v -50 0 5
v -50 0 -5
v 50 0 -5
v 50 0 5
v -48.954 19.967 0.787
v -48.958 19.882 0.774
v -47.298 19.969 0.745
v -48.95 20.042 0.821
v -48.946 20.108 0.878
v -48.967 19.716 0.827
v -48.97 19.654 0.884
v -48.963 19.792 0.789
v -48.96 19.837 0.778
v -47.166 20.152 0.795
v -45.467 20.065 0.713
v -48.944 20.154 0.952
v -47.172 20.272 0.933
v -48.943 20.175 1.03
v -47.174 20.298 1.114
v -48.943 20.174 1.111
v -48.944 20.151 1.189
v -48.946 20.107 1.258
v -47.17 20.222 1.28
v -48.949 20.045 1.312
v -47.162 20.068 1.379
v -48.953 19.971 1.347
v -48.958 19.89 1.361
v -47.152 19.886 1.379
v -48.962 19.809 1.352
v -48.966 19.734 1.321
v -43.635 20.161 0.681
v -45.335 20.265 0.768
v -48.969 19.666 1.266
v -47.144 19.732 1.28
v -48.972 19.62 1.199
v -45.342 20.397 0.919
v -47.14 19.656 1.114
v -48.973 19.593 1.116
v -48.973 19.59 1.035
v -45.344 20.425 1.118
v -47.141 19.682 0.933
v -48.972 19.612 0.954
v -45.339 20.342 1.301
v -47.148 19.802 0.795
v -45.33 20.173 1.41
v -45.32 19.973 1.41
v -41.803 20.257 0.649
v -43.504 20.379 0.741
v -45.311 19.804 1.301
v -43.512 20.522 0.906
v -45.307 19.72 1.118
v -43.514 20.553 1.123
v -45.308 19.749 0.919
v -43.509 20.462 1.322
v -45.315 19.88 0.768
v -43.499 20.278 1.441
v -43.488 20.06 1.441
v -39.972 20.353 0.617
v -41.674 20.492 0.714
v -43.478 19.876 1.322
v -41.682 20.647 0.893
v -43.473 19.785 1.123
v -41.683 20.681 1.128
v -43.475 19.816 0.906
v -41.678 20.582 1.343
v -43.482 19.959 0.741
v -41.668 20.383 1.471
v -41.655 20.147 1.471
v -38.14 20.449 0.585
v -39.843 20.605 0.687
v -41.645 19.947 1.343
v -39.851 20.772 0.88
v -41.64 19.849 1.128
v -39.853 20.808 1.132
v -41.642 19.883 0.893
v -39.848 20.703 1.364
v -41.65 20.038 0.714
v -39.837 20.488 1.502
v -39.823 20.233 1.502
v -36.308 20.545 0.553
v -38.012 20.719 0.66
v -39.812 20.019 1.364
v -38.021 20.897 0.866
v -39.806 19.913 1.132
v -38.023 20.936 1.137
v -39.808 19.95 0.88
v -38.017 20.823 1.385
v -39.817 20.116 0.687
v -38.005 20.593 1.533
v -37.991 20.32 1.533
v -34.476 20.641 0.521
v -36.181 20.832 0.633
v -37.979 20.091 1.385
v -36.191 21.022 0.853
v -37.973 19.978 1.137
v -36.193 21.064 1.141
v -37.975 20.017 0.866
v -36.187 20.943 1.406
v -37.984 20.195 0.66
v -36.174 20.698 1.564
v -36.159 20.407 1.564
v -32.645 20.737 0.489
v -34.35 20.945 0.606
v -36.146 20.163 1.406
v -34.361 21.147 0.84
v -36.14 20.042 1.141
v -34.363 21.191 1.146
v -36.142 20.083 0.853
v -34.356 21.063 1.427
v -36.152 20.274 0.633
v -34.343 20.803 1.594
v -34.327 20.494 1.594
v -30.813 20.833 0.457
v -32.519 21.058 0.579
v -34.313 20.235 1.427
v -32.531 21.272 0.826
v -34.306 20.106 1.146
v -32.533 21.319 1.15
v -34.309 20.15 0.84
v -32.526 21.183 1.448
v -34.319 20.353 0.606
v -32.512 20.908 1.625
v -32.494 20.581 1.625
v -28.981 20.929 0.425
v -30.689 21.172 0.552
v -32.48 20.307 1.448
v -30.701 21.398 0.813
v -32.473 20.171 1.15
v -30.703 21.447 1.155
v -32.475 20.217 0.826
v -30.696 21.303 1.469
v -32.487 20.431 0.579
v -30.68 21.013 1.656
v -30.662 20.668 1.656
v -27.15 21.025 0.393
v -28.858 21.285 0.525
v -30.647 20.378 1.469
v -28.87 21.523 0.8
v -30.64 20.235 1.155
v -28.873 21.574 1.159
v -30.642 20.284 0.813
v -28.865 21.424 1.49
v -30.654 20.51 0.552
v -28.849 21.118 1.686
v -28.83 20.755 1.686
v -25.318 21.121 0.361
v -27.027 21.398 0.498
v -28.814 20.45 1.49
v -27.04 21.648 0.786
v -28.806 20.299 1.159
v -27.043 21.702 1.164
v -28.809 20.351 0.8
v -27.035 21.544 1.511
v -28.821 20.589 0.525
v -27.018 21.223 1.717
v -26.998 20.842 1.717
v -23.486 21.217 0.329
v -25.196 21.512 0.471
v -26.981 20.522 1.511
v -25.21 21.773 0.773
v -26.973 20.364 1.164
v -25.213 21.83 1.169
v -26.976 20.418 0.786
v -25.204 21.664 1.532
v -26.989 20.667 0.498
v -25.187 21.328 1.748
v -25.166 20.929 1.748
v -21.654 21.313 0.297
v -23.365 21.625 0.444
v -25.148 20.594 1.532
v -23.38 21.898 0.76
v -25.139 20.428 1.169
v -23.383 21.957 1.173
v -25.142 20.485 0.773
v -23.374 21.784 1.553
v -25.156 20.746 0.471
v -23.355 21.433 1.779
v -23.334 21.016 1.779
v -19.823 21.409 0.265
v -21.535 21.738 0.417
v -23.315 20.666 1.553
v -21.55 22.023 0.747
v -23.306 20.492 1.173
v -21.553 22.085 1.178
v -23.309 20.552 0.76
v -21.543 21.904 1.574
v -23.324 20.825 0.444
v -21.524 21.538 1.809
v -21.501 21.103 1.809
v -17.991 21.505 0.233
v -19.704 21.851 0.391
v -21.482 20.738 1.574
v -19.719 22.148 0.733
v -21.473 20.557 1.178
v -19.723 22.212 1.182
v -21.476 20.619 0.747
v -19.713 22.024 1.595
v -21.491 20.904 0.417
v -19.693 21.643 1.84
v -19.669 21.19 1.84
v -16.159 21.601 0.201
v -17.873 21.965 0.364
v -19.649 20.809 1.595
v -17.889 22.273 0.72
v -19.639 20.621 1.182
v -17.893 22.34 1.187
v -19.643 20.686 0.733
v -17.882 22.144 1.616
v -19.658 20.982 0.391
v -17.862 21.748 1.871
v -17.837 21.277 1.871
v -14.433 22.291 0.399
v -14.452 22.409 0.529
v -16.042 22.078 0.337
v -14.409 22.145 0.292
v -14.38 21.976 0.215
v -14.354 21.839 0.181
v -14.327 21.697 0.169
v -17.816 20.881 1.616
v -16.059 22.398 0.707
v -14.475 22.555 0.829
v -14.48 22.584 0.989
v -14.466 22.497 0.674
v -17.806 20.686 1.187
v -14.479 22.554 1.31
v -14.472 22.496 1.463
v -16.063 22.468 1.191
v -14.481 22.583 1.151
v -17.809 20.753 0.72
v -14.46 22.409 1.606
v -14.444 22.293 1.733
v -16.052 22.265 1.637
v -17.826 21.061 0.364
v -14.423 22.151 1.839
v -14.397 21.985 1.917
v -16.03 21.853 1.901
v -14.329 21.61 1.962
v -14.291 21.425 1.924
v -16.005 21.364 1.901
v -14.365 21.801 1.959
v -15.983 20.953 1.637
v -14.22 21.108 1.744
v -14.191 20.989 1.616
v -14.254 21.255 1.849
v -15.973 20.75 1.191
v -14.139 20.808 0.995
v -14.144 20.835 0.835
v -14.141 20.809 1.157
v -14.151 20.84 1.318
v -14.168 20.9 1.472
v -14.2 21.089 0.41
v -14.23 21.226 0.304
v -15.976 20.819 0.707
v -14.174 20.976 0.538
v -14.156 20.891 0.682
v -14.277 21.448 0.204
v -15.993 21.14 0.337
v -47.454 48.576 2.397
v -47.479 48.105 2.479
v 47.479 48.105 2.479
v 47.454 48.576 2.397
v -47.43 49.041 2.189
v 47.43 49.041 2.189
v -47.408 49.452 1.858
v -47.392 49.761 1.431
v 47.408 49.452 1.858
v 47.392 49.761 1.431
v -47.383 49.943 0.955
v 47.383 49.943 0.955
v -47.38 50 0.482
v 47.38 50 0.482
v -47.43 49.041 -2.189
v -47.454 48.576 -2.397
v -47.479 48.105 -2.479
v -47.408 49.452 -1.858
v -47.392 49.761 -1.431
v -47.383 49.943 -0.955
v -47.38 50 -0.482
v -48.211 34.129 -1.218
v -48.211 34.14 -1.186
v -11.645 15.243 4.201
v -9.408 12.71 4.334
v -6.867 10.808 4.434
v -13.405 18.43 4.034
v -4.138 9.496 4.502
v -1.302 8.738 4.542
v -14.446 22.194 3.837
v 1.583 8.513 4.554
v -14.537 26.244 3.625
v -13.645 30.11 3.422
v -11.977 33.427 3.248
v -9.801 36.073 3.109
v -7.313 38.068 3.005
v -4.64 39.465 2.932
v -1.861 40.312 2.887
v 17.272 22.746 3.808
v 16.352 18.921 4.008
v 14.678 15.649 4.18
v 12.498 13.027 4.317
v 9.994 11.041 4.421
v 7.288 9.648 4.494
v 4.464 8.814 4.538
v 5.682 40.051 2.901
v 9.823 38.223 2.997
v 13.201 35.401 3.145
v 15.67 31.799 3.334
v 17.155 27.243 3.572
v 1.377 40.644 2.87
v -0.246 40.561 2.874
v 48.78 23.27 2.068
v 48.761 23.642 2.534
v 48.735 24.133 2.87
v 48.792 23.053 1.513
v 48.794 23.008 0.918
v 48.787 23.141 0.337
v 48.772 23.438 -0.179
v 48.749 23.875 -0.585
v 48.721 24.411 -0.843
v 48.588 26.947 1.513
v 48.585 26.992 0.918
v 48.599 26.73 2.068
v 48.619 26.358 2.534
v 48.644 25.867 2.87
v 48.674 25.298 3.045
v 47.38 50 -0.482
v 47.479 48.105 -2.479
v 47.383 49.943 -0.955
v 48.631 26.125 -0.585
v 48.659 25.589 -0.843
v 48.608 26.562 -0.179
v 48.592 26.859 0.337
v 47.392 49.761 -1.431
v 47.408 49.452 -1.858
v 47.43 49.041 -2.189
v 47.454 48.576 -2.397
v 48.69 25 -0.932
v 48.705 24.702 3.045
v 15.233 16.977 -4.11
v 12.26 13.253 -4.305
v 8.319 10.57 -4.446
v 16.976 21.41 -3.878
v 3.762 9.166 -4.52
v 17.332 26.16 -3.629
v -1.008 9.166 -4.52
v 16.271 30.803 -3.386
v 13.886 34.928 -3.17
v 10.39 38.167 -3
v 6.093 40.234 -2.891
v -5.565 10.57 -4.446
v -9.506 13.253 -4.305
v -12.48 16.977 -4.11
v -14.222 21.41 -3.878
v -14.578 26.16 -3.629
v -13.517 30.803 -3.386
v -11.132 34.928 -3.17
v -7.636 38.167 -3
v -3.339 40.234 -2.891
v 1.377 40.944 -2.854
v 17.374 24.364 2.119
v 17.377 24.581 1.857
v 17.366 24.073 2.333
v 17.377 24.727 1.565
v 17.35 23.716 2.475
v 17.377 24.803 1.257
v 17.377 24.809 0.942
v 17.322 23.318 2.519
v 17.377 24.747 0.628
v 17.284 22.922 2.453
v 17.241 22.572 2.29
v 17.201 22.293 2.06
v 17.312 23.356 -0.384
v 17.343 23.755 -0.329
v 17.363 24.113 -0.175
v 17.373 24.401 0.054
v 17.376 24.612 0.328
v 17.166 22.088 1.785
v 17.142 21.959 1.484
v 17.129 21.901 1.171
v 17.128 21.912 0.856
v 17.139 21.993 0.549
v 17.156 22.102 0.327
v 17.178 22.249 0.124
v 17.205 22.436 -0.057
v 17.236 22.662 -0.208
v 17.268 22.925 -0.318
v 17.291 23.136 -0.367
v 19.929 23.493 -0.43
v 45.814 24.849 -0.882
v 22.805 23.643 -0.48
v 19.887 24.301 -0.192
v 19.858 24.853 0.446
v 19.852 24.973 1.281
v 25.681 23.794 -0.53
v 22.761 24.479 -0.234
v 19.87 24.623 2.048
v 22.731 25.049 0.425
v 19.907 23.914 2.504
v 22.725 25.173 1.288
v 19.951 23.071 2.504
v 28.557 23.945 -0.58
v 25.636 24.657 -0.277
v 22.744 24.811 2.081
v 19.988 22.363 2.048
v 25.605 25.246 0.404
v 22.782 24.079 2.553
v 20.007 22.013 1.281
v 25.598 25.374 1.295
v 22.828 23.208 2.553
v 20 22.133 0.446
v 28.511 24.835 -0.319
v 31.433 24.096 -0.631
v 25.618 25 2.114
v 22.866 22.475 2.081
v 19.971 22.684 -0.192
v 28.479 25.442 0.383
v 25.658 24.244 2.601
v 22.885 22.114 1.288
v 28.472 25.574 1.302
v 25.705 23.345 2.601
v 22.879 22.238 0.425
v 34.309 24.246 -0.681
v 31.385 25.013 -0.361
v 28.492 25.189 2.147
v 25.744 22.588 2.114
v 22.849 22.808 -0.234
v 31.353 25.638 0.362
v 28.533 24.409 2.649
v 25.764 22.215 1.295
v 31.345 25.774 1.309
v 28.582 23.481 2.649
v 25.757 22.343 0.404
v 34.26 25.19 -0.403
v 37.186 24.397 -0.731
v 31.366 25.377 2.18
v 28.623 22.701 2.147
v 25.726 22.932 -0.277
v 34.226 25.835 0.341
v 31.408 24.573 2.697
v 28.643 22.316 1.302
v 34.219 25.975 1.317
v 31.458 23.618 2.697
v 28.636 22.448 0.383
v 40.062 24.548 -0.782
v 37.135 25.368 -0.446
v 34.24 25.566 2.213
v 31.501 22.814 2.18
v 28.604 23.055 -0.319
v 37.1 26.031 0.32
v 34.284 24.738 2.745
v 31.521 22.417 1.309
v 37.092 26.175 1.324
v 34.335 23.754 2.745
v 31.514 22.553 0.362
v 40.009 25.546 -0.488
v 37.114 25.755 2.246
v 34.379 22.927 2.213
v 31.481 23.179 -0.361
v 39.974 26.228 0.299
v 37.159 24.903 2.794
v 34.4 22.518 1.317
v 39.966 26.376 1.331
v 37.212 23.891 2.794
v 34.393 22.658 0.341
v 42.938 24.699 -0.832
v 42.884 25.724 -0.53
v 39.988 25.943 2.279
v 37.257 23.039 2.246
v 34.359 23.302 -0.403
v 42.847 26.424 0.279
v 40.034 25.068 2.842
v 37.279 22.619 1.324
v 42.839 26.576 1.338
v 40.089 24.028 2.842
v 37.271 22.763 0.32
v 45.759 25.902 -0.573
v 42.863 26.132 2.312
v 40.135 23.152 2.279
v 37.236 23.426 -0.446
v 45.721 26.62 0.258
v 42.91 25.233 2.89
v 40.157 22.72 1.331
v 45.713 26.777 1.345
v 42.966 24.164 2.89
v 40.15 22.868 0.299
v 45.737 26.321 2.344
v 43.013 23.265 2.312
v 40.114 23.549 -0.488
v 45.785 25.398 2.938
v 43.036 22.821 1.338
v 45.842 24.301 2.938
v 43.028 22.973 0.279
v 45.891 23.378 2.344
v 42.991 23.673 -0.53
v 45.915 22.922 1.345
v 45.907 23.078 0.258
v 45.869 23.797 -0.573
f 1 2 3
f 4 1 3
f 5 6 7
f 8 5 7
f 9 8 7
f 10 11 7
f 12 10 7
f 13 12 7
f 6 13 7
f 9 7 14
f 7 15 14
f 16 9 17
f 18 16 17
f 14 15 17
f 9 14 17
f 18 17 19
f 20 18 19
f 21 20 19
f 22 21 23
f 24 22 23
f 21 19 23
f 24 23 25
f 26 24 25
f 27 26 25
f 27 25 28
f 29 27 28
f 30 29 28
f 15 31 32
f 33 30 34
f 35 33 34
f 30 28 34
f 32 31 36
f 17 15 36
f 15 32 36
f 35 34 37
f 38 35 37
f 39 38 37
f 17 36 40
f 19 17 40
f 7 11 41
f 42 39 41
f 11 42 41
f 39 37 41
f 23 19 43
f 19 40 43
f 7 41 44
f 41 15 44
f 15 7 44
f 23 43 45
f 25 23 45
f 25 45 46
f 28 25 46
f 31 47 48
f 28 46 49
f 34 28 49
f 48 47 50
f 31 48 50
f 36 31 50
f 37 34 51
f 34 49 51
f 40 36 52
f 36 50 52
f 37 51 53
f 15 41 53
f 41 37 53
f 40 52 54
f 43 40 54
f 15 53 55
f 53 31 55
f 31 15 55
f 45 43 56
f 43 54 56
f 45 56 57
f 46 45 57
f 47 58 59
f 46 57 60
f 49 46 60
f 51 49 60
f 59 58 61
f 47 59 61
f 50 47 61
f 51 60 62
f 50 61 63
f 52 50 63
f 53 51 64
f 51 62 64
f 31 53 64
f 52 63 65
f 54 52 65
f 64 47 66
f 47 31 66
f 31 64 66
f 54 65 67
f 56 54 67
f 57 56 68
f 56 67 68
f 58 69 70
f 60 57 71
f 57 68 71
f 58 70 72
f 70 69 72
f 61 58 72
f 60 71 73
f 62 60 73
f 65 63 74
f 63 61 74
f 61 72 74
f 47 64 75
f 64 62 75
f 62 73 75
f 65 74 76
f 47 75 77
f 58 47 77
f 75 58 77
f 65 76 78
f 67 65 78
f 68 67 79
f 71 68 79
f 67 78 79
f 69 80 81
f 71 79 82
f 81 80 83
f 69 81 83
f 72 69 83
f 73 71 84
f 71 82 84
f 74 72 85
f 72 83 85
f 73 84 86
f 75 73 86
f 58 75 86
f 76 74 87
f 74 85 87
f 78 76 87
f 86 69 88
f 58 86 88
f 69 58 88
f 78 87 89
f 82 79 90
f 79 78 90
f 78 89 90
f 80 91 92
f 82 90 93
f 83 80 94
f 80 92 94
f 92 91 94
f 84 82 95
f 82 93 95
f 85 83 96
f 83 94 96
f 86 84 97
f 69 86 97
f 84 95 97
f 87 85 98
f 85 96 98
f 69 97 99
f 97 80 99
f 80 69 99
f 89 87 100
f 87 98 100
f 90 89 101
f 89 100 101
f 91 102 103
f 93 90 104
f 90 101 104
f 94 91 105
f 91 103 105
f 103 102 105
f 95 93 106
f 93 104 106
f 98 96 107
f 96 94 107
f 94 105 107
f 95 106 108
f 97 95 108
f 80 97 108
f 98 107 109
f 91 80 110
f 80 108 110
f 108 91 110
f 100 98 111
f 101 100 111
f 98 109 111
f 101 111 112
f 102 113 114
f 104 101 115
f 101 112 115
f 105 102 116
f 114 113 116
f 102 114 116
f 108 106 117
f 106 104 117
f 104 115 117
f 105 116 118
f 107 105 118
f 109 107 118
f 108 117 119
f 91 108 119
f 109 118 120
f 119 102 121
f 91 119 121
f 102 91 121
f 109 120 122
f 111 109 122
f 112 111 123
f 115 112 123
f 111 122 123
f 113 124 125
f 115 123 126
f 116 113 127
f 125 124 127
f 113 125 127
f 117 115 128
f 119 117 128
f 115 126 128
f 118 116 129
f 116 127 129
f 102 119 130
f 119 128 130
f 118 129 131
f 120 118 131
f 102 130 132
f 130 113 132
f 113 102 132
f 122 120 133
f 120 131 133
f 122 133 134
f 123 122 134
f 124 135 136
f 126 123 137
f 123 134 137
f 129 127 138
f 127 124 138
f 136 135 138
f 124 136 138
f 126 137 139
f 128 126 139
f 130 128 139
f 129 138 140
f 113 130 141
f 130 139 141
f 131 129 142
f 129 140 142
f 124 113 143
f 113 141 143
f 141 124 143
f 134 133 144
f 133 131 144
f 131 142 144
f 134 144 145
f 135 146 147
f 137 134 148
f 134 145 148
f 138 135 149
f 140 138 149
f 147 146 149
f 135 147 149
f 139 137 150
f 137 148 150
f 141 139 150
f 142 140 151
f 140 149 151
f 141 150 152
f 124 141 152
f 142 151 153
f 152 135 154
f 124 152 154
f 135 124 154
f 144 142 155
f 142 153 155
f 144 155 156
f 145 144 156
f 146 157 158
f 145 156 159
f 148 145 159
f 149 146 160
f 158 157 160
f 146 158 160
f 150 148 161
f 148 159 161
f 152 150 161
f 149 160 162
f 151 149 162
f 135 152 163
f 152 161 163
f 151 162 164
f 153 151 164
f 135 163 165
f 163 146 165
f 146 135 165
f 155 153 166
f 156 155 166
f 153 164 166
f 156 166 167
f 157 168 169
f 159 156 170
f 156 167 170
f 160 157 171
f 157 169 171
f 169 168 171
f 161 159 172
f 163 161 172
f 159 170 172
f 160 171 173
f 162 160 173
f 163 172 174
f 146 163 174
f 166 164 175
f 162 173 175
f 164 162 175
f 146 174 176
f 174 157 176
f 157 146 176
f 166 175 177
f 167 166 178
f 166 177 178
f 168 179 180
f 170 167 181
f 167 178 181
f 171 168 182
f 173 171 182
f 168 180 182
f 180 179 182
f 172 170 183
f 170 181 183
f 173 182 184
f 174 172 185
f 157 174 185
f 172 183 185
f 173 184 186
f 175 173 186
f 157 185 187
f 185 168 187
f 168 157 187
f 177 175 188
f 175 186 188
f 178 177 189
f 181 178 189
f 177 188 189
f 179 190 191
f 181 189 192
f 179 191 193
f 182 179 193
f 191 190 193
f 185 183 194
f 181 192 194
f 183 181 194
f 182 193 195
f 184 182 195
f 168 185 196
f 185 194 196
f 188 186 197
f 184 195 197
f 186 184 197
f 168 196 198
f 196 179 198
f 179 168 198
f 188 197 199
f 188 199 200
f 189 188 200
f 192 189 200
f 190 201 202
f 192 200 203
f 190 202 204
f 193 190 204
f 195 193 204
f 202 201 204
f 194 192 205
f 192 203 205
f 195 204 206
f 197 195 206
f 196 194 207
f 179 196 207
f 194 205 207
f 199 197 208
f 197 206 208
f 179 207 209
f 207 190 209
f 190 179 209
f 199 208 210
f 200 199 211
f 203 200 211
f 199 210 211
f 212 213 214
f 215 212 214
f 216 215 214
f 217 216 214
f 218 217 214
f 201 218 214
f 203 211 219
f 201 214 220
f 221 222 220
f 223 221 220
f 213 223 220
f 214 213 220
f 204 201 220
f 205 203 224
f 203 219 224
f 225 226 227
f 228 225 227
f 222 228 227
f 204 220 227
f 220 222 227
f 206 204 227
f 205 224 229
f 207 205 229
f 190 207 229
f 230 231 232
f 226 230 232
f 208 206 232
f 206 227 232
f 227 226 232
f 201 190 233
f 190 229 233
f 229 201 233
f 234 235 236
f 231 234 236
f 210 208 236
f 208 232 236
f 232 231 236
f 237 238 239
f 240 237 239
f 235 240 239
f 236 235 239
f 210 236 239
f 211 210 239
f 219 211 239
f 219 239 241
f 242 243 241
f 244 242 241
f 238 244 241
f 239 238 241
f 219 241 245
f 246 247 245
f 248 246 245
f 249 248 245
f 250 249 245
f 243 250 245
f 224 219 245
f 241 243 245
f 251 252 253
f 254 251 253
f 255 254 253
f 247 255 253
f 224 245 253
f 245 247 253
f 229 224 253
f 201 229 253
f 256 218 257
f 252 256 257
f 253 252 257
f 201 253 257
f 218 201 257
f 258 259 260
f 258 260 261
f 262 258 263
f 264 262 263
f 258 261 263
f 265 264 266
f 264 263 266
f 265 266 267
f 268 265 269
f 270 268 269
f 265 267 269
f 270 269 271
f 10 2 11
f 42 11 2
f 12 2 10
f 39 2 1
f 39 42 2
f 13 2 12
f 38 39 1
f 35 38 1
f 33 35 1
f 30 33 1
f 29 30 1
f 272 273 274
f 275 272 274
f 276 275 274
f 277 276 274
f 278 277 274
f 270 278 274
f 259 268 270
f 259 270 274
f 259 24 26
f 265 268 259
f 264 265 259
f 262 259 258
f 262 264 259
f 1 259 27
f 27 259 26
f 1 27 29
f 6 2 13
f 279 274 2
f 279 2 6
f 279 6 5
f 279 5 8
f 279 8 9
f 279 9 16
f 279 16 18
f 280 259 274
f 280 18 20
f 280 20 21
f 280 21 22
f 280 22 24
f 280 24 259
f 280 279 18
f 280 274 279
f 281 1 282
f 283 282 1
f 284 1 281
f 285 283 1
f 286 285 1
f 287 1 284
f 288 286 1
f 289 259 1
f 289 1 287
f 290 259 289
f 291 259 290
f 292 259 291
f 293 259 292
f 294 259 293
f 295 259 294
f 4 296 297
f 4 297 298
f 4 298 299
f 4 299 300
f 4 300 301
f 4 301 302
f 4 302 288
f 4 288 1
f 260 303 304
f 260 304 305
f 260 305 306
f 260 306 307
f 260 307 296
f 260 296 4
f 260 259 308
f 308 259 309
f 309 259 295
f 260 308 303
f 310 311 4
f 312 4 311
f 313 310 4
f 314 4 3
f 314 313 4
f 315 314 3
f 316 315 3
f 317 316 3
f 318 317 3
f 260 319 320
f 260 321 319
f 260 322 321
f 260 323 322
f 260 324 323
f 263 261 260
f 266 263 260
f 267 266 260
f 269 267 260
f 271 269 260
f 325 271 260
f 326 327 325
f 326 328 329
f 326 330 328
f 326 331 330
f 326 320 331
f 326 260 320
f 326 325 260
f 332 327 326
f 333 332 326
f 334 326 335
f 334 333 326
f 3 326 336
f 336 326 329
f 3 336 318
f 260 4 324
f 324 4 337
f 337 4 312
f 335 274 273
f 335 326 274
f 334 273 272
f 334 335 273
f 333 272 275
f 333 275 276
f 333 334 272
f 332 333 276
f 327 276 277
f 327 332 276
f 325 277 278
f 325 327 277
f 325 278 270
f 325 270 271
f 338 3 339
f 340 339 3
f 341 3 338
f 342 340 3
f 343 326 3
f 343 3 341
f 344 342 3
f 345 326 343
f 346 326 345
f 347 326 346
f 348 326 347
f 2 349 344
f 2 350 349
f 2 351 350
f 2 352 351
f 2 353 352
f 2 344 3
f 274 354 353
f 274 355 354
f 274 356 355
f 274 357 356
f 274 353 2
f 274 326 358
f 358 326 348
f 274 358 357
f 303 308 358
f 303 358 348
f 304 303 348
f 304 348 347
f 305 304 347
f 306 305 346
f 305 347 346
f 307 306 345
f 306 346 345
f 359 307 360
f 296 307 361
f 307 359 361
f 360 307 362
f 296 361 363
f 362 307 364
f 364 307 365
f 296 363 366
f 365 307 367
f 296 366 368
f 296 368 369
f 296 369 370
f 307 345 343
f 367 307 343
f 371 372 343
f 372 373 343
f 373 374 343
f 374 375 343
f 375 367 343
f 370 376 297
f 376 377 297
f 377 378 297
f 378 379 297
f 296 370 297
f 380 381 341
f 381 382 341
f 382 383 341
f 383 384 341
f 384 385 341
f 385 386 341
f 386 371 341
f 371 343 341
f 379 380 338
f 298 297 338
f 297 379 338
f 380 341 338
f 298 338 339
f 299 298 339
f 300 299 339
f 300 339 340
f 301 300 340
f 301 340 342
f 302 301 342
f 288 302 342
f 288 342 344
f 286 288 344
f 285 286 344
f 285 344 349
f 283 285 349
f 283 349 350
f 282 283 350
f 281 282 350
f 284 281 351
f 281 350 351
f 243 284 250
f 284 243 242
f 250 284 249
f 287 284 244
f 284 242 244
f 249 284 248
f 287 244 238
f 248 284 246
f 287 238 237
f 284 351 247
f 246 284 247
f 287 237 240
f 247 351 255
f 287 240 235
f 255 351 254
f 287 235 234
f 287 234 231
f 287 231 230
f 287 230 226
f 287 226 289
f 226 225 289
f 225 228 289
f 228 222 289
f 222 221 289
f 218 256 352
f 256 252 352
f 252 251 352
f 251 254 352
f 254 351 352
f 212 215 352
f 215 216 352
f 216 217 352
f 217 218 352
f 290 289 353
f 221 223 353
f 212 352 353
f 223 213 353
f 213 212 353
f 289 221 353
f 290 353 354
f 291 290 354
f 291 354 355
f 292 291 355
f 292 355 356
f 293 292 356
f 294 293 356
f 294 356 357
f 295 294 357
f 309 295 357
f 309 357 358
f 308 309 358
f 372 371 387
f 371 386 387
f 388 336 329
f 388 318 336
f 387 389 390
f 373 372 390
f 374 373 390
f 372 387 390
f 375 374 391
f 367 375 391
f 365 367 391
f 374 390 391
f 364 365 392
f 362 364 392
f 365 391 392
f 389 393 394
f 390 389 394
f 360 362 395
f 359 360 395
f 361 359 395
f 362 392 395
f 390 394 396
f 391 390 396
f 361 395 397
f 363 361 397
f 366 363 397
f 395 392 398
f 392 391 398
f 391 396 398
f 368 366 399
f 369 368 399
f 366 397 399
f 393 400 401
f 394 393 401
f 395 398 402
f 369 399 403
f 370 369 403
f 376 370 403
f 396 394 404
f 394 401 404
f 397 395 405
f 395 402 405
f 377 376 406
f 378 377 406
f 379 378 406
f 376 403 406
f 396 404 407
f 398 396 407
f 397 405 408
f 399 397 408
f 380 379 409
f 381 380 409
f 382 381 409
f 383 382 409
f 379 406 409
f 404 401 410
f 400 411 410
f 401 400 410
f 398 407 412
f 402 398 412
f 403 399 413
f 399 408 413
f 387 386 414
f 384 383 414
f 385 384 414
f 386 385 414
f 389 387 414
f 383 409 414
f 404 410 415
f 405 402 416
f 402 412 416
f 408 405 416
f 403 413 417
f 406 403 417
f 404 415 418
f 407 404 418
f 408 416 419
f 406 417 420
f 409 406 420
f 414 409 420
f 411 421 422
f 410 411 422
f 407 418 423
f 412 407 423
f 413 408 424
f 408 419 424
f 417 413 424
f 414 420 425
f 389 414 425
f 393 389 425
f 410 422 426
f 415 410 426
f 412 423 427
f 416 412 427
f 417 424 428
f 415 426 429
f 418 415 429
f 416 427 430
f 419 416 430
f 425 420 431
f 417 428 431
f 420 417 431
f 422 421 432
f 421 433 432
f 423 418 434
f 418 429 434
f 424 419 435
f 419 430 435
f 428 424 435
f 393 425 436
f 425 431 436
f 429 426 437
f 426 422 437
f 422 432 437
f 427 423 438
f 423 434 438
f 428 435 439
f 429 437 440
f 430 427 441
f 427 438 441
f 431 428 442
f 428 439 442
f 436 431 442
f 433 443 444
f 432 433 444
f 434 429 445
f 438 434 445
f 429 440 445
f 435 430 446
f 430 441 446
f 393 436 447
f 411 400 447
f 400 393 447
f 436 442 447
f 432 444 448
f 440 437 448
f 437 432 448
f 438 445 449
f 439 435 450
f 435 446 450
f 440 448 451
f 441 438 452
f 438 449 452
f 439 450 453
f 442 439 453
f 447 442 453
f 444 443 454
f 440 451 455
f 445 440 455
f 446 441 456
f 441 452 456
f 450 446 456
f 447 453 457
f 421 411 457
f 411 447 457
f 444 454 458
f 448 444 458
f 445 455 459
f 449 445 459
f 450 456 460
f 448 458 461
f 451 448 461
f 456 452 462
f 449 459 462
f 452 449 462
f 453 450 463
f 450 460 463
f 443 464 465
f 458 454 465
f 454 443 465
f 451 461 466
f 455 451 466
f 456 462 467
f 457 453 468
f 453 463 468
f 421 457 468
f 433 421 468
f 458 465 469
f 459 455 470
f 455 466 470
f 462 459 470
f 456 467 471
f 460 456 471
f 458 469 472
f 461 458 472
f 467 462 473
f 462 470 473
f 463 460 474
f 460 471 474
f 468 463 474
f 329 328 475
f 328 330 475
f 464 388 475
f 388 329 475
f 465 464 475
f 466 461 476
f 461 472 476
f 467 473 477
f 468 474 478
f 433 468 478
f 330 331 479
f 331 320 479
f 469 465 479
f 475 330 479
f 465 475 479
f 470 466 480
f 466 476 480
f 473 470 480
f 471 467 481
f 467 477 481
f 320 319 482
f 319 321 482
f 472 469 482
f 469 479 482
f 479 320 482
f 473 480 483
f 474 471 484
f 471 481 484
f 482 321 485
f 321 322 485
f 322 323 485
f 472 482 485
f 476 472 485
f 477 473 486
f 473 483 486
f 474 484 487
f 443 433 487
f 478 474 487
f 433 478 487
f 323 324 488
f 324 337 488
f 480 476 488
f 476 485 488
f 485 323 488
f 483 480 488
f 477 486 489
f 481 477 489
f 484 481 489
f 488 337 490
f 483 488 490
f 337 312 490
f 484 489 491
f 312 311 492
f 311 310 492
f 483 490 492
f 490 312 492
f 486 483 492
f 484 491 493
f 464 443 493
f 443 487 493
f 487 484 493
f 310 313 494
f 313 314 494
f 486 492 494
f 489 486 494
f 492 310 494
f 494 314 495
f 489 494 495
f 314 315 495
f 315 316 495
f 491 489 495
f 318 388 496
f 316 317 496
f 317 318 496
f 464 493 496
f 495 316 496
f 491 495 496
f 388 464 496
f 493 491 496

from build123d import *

# Parameters (mm, degrees)
SKETCH1_W           = 100
SKETCH1_H           = 10
BOSS_EXTRUDE1_DEPTH = 50
BOSS_EXTRUDE1_TAPER = 3
FILLET1_R           = 2
SKETCH2_R           = 16
CUT_EXTRUDE1_DEPTH  = 50
SKETCH3_R           = 2
CUT_EXTRUDE2_DEPTH  = 105
CUT_EXTRUDE2_DRAFT  = -1


with BuildPart() as part:
    # Sketch1 → Boss-Extrude1 (new body)
    with BuildSketch(Plane(origin=(0, 0, 0), x_dir=(1, 0, 0), z_dir=(0, 1, 0))):
        Rectangle(SKETCH1_W, SKETCH1_H)
    extrude(amount=BOSS_EXTRUDE1_DEPTH, taper=BOSS_EXTRUDE1_TAPER)

    # Fillet1
    fillet1_edges = [part.edges().sort_by_distance(p)[0] for p in [
        (0, 50, 2.379611036),
        (0, 50, -2.379611036),
    ]]
    fillet(fillet1_edges, radius=FILLET1_R)

    # Sketch2 → Cut-Extrude1 (cut)
    with BuildSketch(Plane(origin=(0, 0.261321158, -4.986304738), x_dir=(-1, 0, 0), z_dir=(0, 0.052335956242943876, -0.998629534754574))):
        with Locations(Location((-1.376828388, 24.738320219, 0), (0, 0, 90))):
            Circle(SKETCH2_R)
    extrude(amount=-CUT_EXTRUDE1_DEPTH, mode=Mode.SUBTRACT)


with BuildPart() as cut_extrude2_tool:
    # Sketch3 → Cut-Extrude2 (with draft: the straight prism first)
    with BuildSketch(Plane(origin=(49.863047384, 2.613211582, 0), x_dir=(0, 0, -1), z_dir=(0.998629534754574, 0.052335956242943876, 0))):
        with Locations((-1.067678457, 22.417510838)):
            Circle(SKETCH3_R)
    extrude(amount=-CUT_EXTRUDE2_DEPTH)
    # Cut-Extrude2: the draft: its side faces are tilted about the plane it starts from
    cut_extrude2_sides = [cut_extrude2_tool.faces().sort_by_distance(p)[0] for p in [
        (-3.738245057, 22.252362297, 3.067678457),
    ]]
    draft(cut_extrude2_sides, Plane(origin=(49.863047384, 2.613211582, 0), x_dir=(0, 0, -1), z_dir=(0.998629534754574, 0.052335956242943876, 0)), CUT_EXTRUDE2_DRAFT)


with BuildPart() as part_1:
    add(part.part)

    # Cut-Extrude2: cut by cut_extrude2_tool
    add(cut_extrude2_tool.part, mode=Mode.SUBTRACT)


solid = part_1.part
